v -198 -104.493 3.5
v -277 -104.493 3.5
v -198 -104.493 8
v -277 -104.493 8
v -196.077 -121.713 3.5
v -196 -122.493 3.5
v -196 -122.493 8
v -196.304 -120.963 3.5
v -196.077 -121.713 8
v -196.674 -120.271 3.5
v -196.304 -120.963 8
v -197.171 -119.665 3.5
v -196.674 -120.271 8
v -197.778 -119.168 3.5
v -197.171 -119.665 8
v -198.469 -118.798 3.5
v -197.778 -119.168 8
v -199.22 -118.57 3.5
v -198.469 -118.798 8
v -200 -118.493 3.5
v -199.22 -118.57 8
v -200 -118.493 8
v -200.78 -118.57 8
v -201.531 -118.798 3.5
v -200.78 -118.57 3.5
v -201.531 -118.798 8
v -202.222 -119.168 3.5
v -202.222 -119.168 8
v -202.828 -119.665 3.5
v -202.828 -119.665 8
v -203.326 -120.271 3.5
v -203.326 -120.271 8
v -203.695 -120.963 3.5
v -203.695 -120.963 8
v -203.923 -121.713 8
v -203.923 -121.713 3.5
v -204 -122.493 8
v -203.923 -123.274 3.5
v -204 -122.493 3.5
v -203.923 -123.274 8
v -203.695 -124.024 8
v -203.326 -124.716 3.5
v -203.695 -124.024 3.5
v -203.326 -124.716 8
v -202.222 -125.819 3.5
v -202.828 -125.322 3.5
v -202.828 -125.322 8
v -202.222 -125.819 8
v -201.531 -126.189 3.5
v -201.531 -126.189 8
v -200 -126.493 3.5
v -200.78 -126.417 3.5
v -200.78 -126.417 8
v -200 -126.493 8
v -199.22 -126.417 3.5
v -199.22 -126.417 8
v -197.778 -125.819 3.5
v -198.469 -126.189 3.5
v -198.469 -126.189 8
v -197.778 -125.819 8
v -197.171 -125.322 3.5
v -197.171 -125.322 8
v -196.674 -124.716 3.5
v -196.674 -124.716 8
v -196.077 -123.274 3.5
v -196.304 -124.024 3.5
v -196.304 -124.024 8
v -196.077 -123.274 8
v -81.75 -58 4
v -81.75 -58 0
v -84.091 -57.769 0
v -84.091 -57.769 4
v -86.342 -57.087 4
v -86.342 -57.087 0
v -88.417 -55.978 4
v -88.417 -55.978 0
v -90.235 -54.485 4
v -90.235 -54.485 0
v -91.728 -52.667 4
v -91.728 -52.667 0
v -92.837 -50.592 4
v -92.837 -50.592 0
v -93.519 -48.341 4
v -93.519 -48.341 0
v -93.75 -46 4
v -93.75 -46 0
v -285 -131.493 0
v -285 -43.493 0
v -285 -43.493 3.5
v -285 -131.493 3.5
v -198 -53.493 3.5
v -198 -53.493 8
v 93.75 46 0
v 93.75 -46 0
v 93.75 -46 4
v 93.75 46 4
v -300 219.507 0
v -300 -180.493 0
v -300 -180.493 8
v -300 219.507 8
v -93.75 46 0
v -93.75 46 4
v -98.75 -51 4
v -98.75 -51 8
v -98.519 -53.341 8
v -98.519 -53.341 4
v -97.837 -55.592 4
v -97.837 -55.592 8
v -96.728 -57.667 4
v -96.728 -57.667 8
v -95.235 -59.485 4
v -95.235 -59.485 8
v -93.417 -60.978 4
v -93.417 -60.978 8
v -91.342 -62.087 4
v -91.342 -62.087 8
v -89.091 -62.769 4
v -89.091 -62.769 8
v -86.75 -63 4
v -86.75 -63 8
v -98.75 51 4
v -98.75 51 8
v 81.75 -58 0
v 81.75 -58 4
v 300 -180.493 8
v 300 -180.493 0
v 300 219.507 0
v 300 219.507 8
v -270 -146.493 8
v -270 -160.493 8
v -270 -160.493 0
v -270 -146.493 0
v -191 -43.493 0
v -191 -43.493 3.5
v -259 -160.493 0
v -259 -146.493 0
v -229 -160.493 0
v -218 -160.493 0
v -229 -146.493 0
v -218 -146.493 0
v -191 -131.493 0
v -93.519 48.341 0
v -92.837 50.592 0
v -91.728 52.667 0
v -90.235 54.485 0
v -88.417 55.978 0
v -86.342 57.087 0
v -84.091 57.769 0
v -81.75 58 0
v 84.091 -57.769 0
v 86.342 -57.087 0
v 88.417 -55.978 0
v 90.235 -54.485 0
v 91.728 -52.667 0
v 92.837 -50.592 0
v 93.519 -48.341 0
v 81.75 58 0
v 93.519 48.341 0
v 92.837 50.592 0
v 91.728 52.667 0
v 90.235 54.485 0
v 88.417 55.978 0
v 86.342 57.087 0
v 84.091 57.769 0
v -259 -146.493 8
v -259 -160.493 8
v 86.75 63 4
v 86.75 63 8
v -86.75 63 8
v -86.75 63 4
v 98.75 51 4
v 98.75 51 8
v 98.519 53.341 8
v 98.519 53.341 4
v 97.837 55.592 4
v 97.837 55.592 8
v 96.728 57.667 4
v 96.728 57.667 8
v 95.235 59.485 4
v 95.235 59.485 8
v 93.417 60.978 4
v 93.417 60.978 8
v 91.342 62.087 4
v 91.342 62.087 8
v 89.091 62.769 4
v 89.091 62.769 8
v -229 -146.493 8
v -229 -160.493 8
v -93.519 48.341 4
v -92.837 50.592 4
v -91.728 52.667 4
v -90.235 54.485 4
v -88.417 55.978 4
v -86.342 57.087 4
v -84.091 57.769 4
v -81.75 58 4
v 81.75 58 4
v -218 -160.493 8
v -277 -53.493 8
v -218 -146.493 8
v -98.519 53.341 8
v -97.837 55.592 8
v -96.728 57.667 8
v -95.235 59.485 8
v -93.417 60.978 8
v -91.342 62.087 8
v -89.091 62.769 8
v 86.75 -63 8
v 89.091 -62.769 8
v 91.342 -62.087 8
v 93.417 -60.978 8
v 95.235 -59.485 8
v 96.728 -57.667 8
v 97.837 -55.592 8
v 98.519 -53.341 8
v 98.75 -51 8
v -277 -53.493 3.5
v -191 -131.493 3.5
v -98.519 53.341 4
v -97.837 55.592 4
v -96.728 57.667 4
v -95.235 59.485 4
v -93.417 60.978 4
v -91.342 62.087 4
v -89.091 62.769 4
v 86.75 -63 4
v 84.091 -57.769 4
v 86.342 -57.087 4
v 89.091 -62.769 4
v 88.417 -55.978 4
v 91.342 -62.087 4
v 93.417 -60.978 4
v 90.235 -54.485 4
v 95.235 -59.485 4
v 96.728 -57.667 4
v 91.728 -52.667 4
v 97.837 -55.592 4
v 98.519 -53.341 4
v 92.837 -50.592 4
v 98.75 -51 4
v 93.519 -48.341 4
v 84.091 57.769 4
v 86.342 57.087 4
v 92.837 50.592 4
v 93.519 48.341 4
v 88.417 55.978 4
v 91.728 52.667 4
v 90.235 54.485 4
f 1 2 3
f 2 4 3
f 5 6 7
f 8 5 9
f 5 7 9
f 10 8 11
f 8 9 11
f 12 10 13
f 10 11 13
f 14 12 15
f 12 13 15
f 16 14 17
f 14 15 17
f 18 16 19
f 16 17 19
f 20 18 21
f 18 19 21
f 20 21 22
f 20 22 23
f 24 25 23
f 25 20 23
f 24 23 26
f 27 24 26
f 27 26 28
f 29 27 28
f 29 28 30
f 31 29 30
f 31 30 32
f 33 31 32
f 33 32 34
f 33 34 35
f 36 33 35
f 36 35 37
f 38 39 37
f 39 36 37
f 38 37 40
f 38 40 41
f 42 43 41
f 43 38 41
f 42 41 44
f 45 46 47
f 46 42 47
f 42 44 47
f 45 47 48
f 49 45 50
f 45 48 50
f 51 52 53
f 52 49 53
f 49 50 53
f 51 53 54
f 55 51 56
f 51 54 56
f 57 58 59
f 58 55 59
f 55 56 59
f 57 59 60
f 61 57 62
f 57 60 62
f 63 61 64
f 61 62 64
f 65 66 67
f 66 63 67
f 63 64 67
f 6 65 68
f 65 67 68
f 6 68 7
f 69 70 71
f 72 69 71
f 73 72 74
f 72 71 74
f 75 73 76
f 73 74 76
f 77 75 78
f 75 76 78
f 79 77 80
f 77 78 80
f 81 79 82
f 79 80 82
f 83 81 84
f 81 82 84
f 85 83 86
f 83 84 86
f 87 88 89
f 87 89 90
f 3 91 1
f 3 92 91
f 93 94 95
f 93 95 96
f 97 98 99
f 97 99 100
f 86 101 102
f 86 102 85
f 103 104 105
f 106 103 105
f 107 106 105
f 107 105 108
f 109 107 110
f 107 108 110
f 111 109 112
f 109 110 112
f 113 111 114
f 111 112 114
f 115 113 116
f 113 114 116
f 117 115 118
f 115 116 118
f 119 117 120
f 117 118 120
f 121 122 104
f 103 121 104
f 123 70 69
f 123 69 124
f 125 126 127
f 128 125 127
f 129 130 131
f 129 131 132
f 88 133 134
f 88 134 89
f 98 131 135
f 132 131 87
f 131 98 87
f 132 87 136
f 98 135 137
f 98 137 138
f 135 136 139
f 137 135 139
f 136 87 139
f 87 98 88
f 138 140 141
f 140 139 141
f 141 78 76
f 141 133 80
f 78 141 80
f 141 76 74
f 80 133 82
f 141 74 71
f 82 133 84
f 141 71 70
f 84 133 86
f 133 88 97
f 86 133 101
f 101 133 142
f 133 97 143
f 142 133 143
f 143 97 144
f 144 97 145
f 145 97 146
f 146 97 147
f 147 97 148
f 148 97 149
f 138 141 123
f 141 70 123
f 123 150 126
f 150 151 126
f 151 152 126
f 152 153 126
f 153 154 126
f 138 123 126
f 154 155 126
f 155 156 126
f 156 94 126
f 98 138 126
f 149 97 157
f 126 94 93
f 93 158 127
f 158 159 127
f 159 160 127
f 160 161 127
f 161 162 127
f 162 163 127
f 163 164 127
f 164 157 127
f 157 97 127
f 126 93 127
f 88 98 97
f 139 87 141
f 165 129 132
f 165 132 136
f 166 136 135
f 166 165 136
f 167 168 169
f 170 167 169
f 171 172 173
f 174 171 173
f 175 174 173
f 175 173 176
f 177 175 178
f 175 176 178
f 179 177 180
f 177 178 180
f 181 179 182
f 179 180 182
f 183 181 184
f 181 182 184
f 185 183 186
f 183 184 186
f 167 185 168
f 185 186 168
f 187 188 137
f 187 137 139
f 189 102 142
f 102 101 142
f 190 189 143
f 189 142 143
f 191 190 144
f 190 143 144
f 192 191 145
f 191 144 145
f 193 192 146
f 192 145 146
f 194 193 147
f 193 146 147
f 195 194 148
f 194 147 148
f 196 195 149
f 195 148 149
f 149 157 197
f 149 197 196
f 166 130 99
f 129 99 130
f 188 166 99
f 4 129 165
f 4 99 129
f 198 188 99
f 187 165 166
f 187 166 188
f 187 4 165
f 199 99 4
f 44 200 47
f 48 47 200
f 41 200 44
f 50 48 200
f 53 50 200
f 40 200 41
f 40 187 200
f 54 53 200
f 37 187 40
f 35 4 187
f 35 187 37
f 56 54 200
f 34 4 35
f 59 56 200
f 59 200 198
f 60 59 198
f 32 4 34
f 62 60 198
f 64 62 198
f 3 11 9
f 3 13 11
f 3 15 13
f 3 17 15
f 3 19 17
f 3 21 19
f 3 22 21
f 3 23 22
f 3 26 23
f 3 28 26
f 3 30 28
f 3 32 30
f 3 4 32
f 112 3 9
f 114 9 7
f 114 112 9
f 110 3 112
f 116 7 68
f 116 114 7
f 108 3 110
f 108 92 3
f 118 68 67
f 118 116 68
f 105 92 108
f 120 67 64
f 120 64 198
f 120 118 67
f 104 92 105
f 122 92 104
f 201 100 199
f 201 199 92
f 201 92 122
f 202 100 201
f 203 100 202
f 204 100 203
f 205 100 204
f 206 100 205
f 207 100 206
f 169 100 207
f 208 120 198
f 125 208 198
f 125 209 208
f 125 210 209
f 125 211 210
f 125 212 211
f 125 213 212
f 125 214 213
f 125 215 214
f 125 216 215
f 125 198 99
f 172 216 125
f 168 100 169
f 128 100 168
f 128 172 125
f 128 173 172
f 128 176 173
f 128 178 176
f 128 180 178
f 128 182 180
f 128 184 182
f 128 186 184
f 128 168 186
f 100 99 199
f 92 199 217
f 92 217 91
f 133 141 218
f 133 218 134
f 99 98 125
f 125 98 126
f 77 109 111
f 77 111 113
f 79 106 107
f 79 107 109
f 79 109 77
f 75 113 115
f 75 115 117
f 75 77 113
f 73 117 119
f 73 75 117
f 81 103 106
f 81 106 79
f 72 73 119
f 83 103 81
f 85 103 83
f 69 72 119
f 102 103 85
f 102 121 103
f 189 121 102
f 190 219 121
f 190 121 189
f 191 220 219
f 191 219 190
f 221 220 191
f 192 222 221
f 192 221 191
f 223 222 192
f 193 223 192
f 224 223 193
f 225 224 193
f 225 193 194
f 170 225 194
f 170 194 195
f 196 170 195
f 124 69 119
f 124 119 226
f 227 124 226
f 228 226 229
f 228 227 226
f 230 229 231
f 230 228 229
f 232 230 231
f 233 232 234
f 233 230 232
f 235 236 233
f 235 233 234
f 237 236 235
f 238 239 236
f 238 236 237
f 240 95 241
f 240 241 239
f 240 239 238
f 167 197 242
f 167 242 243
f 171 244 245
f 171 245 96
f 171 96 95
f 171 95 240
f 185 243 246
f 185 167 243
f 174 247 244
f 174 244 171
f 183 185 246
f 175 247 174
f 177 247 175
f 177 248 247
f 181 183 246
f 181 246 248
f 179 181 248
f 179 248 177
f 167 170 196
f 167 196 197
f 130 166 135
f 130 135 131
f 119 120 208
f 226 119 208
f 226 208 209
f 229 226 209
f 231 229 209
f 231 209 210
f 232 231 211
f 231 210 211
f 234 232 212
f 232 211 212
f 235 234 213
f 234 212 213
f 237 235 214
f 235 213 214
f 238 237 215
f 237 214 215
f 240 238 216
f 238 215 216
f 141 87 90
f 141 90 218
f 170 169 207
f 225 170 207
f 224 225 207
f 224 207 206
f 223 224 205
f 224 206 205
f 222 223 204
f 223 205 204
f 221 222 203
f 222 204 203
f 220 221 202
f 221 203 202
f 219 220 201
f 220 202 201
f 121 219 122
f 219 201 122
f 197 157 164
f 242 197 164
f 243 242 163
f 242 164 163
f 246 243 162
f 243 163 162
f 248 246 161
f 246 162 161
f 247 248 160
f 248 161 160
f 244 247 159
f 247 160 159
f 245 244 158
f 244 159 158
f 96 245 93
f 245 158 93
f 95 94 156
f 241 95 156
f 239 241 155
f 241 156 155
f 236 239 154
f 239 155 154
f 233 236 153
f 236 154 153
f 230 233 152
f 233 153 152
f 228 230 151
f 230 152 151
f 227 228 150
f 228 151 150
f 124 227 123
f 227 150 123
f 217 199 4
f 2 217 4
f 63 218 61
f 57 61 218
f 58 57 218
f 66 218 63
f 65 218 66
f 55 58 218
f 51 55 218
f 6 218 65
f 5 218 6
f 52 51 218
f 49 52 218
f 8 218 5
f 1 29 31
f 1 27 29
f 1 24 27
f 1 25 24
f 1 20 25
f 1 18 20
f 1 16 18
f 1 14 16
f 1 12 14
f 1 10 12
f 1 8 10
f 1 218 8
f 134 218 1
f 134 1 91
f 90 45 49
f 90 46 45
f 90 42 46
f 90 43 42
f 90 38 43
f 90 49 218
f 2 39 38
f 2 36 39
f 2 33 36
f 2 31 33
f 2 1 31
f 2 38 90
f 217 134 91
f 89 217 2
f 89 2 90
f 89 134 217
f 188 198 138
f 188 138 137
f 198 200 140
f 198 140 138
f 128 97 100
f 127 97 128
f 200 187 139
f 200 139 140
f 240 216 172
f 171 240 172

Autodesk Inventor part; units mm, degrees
ref_plane "YZ Plane" through (0, 0, 0) normal (1, 0, 0) x (0, 1, 0)
ref_plane "XZ Plane" through (0, 0, 0) normal (0, 1, 0) x (-1, 0, 0)
ref_plane "XY Plane" through (0, 0, 0) normal (0, 0, 1) x (1, 0, 0)
sketch "Sketch2" plane through (0, 0, 0) normal (0, 0, 1) x (1, 0, 0)
  line L0 (-299.9999, -180.4934) -> (300.0001, -180.4934) projected
  line L1 (300.0001, -180.4934) -> (300.0001, 219.5066) projected
  line L2 (-299.9999, 219.5066) -> (300.0001, 219.5066) projected
  line L3 (-299.9999, -180.4934) -> (-299.9999, 219.5066) projected
  line L4 (-93.75, 46) -> (-93.75, -46) projected
  arc A0 (-93.75, -46) -> (-81.75, -58) centre (-81.75, -46) ccw projected
  line L5 (-81.75, -58) -> (81.75, -58) projected
  arc A1 (81.75, -58) -> (93.75, -46) centre (81.75, -46) ccw projected
  line L6 (93.75, -46) -> (93.75, 46) projected
  arc A2 (93.75, 46) -> (81.75, 58) centre (81.75, 46) ccw projected
  line L7 (81.75, 58) -> (-81.75, 58) projected
  arc A3 (-81.75, 58) -> (-93.75, 46) centre (-81.75, 46) ccw projected
  point P0 (0, 0)
extrude "Extrusion1" add sketch "Sketch2" along normal blind 8
sketch "Sketch3" plane through (0, 0, 8) normal (0, 0, 1) x (1, 0, 0)
  arc A0 (86.75, -63) -> (98.75, -51) centre (86.75, -51) ccw projected
  line L0 (-86.75, -63) -> (86.75, -63) projected
  arc A1 (-98.75, -51) -> (-86.75, -63) centre (-86.75, -51) ccw projected
  line L1 (-98.75, 51) -> (-98.75, -51) projected
  arc A2 (-86.75, 63) -> (-98.75, 51) centre (-86.75, 51) ccw projected
  line L2 (86.75, 63) -> (-86.75, 63) projected
  arc A3 (98.75, 51) -> (86.75, 63) centre (86.75, 51) ccw projected
  line L3 (98.75, -51) -> (98.75, 51) projected
  point P0 (0, 0)
extrude "Extrusion2" cut sketch "Sketch3" against normal blind 4
sketch "Sketch4" plane through (0, 0, 8) normal (0, 0, 1) x (1, 0, 0)
  line L0 (-269.9999, -146.4934) -> (-258.9999, -146.4934)
  line L1 (-258.9999, -146.4934) -> (-258.9999, -160.4934)
  line L2 (-258.9999, -160.4934) -> (-269.9999, -160.4934)
  line L3 (-269.9999, -160.4934) -> (-269.9999, -146.4934)
  line L4 (-228.9999, -146.4934) -> (-217.9999, -146.4934)
  line L5 (-217.9999, -146.4934) -> (-217.9999, -160.4934)
  line L6 (-217.9999, -160.4934) -> (-228.9999, -160.4934)
  line L7 (-228.9999, -160.4934) -> (-228.9999, -146.4934)
  line L8 (-299.9999, 219.5066) -> (-299.9999, -180.4934) projected
  line L9 (-299.9999, -180.4934) -> (300.0001, -180.4934) projected
  line L10 (-299.9999, -131.4934) -> (-6.35, -131.4934) construction
  line L11 (-284.9999, -131.4934) -> (-284.9999, 24.5066) construction
  line L12 (-284.9999, -104.4934) -> (-276.9999, -104.4934) construction
  line L13 (-284.9999, -53.4934) -> (-276.9999, -53.4934) construction
  line L14 (-276.9999, 23.0066) -> (-276.9999, -53.4934) construction
  line L15 (-190.9999, -131.4934) -> (-190.9999, 19.5066) construction
  line L16 (-197.9999, 19.5066) -> (-197.9999, -53.4934) construction
  circle A0 centre (-199.9999, -122.4934) radius 4
  line L17 (-276.9999, -104.4934) -> (-197.9999, -104.4934)
  line L18 (-197.9999, -104.4934) -> (-6.35, -104.4934) construction
  line L19 (-197.9999, -53.4934) -> (-197.9999, -104.4934)
  line L20 (-197.9999, -53.4934) -> (-6.35, -53.4934) construction
  line L21 (-276.9999, -53.4934) -> (-197.9999, -53.4934)
  line L22 (-276.9999, -53.4934) -> (-276.9999, -104.4934)
  line L23 (-276.9999, -104.4934) -> (-276.9999, -131.4934) construction
  point P0 (0, 0)
  dimension "d4" = 30
  dimension "d5" = 20
  dimension "d6" = 14
  dimension "d7" = 11
  dimension "d8" = 30
  dimension "d9" = 11
  dimension "d10" = 15
  dimension "d11" = 15
  dimension "d12" = 27
  dimension "d13" = 51
  dimension "d14" = 8
  dimension "d15" = 94
  dimension "d16" = 79
  dimension "d17" = 8
  dimension "d19" = 85
  dimension "d20" = 9
extrude "Extrusion3" cut sketch "Sketch4" against normal through all
sketch "Sketch5" plane through (0, 0, 8) normal (0, 0, 1) x (1, 0, 0)
  line L0 (-284.9999, -43.4934) -> (-190.9999, -43.4934)
  line L1 (-190.9999, -43.4934) -> (-190.9999, -131.4934)
  line L2 (-190.9999, -131.4934) -> (-284.9999, -131.4934)
  line L3 (-284.9999, -131.4934) -> (-284.9999, -43.4934)
  line L4 (-276.9999, -104.4934) -> (-276.9999, -53.4934) projected
  line L5 (-276.9999, -53.4934) -> (-197.9999, -53.4934) projected
  line L6 (-217.9999, -160.4934) -> (-217.9999, -146.4934) projected
  line L7 (-217.9999, -146.4934) -> (-228.9999, -146.4934) projected
  line L8 (-228.9999, -146.4934) -> (-228.9999, -160.4934) projected
  line L9 (-228.9999, -160.4934) -> (-217.9999, -160.4934) projected
  circle A0 centre (-199.9999, -122.4934) radius 4 projected
  line L10 (-258.9999, -160.4934) -> (-258.9999, -146.4934) projected
  line L11 (-258.9999, -146.4934) -> (-269.9999, -146.4934) projected
  line L12 (-269.9999, -146.4934) -> (-269.9999, -160.4934) projected
  line L13 (-269.9999, -160.4934) -> (-258.9999, -160.4934) projected
  line L14 (-276.9999, -104.4934) -> (-197.9999, -104.4934) projected
  line L15 (-197.9999, -104.4934) -> (-197.9999, -53.4934) projected
  line L16 (98.75, -51) -> (98.75, 51) projected
  arc A1 (98.75, 51) -> (86.75, 63) centre (86.75, 51) ccw projected
  line L17 (86.75, 63) -> (-86.75, 63) projected
  arc A2 (-86.75, 63) -> (-98.75, 51) centre (-86.75, 51) ccw projected
  line L18 (-98.75, 51) -> (-98.75, -51) projected
  arc A3 (-98.75, -51) -> (-86.75, -63) centre (-86.75, -51) ccw projected
  line L19 (-86.75, -63) -> (86.75, -63) projected
  arc A4 (86.75, -63) -> (98.75, -51) centre (86.75, -51) ccw projected
  line L20 (-299.9999, -180.4934) -> (-299.9999, 219.5066) projected
  line L21 (-299.9999, 219.5066) -> (300.0001, 219.5066) projected
  line L22 (300.0001, 219.5066) -> (300.0001, -180.4934) projected
  line L23 (300.0001, -180.4934) -> (-299.9999, -180.4934) projected
  line L24 (-276.9999, -53.4934) -> (-276.9999, -104.4934) projected
  line L25 (-197.9999, -53.4934) -> (-276.9999, -53.4934) projected
  point P0 (0, 0)
  dimension "d23" = 88
  dimension "d24" = 94
  dimension "d25" = 8
  dimension "d26" = 10
sketch "Sketch6" plane through (0, 0, 0) normal (0, 0, -1) x (-1, 0, 0)
  line L0 (217.9999, -146.4934) -> (217.9999, -160.4934) projected
  line L1 (217.9999, -160.4934) -> (228.9999, -160.4934) projected
  line L2 (228.9999, -160.4934) -> (228.9999, -146.4934) projected
  line L3 (228.9999, -146.4934) -> (217.9999, -146.4934) projected
  circle A0 centre (199.9999, -122.4934) radius 4 projected
  line L4 (258.9999, -146.4934) -> (258.9999, -160.4934) projected
  line L5 (258.9999, -160.4934) -> (269.9999, -160.4934) projected
  line L6 (269.9999, -160.4934) -> (269.9999, -146.4934) projected
  line L7 (269.9999, -146.4934) -> (258.9999, -146.4934) projected
  line L8 (276.9999, -104.4934) -> (276.9999, -53.4934) projected
  line L9 (276.9999, -53.4934) -> (197.9999, -53.4934) projected
  line L10 (197.9999, -53.4934) -> (197.9999, -104.4934) projected
  line L11 (197.9999, -104.4934) -> (276.9999, -104.4934) projected
  arc A1 (-93.75, -46) -> (-81.75, -58) centre (-81.75, -46) ccw projected
  line L12 (-81.75, -58) -> (81.75, -58) projected
  arc A2 (81.75, -58) -> (93.75, -46) centre (81.75, -46) ccw projected
  line L13 (93.75, -46) -> (93.75, 46) projected
  arc A3 (93.75, 46) -> (81.75, 58) centre (81.75, 46) ccw projected
  line L14 (81.75, 58) -> (-81.75, 58) projected
  arc A4 (-81.75, 58) -> (-93.75, 46) centre (-81.75, 46) ccw projected
  line L15 (-93.75, 46) -> (-93.75, -46) projected
  line L16 (299.9999, 219.5066) -> (299.9999, -180.4934) projected
  line L17 (299.9999, -180.4934) -> (-300.0001, -180.4934) projected
  line L18 (-300.0001, -180.4934) -> (-300.0001, 219.5066) projected
  line L19 (-300.0001, 219.5066) -> (299.9999, 219.5066) projected
  line L20 (190.9999, -43.4934) -> (284.9999, -43.4934)
  line L21 (284.9999, -43.4934) -> (284.9999, -131.4934)
  line L22 (284.9999, -131.4934) -> (190.9999, -131.4934)
  line L23 (190.9999, -131.4934) -> (190.9999, -43.4934)
  point P0 (0, 0)
  dimension "d27" = 94
  dimension "d28" = 88
  dimension "d29" = 8
  dimension "d30" = 10
extrude "Extrusion4" cut sketch "Sketch6" against normal blind 3.5 contours L20 L21 L22 L23
equation "\"d9\" = d7"
properties part number "capac cu gaura" material "Wood (Cherry)"
